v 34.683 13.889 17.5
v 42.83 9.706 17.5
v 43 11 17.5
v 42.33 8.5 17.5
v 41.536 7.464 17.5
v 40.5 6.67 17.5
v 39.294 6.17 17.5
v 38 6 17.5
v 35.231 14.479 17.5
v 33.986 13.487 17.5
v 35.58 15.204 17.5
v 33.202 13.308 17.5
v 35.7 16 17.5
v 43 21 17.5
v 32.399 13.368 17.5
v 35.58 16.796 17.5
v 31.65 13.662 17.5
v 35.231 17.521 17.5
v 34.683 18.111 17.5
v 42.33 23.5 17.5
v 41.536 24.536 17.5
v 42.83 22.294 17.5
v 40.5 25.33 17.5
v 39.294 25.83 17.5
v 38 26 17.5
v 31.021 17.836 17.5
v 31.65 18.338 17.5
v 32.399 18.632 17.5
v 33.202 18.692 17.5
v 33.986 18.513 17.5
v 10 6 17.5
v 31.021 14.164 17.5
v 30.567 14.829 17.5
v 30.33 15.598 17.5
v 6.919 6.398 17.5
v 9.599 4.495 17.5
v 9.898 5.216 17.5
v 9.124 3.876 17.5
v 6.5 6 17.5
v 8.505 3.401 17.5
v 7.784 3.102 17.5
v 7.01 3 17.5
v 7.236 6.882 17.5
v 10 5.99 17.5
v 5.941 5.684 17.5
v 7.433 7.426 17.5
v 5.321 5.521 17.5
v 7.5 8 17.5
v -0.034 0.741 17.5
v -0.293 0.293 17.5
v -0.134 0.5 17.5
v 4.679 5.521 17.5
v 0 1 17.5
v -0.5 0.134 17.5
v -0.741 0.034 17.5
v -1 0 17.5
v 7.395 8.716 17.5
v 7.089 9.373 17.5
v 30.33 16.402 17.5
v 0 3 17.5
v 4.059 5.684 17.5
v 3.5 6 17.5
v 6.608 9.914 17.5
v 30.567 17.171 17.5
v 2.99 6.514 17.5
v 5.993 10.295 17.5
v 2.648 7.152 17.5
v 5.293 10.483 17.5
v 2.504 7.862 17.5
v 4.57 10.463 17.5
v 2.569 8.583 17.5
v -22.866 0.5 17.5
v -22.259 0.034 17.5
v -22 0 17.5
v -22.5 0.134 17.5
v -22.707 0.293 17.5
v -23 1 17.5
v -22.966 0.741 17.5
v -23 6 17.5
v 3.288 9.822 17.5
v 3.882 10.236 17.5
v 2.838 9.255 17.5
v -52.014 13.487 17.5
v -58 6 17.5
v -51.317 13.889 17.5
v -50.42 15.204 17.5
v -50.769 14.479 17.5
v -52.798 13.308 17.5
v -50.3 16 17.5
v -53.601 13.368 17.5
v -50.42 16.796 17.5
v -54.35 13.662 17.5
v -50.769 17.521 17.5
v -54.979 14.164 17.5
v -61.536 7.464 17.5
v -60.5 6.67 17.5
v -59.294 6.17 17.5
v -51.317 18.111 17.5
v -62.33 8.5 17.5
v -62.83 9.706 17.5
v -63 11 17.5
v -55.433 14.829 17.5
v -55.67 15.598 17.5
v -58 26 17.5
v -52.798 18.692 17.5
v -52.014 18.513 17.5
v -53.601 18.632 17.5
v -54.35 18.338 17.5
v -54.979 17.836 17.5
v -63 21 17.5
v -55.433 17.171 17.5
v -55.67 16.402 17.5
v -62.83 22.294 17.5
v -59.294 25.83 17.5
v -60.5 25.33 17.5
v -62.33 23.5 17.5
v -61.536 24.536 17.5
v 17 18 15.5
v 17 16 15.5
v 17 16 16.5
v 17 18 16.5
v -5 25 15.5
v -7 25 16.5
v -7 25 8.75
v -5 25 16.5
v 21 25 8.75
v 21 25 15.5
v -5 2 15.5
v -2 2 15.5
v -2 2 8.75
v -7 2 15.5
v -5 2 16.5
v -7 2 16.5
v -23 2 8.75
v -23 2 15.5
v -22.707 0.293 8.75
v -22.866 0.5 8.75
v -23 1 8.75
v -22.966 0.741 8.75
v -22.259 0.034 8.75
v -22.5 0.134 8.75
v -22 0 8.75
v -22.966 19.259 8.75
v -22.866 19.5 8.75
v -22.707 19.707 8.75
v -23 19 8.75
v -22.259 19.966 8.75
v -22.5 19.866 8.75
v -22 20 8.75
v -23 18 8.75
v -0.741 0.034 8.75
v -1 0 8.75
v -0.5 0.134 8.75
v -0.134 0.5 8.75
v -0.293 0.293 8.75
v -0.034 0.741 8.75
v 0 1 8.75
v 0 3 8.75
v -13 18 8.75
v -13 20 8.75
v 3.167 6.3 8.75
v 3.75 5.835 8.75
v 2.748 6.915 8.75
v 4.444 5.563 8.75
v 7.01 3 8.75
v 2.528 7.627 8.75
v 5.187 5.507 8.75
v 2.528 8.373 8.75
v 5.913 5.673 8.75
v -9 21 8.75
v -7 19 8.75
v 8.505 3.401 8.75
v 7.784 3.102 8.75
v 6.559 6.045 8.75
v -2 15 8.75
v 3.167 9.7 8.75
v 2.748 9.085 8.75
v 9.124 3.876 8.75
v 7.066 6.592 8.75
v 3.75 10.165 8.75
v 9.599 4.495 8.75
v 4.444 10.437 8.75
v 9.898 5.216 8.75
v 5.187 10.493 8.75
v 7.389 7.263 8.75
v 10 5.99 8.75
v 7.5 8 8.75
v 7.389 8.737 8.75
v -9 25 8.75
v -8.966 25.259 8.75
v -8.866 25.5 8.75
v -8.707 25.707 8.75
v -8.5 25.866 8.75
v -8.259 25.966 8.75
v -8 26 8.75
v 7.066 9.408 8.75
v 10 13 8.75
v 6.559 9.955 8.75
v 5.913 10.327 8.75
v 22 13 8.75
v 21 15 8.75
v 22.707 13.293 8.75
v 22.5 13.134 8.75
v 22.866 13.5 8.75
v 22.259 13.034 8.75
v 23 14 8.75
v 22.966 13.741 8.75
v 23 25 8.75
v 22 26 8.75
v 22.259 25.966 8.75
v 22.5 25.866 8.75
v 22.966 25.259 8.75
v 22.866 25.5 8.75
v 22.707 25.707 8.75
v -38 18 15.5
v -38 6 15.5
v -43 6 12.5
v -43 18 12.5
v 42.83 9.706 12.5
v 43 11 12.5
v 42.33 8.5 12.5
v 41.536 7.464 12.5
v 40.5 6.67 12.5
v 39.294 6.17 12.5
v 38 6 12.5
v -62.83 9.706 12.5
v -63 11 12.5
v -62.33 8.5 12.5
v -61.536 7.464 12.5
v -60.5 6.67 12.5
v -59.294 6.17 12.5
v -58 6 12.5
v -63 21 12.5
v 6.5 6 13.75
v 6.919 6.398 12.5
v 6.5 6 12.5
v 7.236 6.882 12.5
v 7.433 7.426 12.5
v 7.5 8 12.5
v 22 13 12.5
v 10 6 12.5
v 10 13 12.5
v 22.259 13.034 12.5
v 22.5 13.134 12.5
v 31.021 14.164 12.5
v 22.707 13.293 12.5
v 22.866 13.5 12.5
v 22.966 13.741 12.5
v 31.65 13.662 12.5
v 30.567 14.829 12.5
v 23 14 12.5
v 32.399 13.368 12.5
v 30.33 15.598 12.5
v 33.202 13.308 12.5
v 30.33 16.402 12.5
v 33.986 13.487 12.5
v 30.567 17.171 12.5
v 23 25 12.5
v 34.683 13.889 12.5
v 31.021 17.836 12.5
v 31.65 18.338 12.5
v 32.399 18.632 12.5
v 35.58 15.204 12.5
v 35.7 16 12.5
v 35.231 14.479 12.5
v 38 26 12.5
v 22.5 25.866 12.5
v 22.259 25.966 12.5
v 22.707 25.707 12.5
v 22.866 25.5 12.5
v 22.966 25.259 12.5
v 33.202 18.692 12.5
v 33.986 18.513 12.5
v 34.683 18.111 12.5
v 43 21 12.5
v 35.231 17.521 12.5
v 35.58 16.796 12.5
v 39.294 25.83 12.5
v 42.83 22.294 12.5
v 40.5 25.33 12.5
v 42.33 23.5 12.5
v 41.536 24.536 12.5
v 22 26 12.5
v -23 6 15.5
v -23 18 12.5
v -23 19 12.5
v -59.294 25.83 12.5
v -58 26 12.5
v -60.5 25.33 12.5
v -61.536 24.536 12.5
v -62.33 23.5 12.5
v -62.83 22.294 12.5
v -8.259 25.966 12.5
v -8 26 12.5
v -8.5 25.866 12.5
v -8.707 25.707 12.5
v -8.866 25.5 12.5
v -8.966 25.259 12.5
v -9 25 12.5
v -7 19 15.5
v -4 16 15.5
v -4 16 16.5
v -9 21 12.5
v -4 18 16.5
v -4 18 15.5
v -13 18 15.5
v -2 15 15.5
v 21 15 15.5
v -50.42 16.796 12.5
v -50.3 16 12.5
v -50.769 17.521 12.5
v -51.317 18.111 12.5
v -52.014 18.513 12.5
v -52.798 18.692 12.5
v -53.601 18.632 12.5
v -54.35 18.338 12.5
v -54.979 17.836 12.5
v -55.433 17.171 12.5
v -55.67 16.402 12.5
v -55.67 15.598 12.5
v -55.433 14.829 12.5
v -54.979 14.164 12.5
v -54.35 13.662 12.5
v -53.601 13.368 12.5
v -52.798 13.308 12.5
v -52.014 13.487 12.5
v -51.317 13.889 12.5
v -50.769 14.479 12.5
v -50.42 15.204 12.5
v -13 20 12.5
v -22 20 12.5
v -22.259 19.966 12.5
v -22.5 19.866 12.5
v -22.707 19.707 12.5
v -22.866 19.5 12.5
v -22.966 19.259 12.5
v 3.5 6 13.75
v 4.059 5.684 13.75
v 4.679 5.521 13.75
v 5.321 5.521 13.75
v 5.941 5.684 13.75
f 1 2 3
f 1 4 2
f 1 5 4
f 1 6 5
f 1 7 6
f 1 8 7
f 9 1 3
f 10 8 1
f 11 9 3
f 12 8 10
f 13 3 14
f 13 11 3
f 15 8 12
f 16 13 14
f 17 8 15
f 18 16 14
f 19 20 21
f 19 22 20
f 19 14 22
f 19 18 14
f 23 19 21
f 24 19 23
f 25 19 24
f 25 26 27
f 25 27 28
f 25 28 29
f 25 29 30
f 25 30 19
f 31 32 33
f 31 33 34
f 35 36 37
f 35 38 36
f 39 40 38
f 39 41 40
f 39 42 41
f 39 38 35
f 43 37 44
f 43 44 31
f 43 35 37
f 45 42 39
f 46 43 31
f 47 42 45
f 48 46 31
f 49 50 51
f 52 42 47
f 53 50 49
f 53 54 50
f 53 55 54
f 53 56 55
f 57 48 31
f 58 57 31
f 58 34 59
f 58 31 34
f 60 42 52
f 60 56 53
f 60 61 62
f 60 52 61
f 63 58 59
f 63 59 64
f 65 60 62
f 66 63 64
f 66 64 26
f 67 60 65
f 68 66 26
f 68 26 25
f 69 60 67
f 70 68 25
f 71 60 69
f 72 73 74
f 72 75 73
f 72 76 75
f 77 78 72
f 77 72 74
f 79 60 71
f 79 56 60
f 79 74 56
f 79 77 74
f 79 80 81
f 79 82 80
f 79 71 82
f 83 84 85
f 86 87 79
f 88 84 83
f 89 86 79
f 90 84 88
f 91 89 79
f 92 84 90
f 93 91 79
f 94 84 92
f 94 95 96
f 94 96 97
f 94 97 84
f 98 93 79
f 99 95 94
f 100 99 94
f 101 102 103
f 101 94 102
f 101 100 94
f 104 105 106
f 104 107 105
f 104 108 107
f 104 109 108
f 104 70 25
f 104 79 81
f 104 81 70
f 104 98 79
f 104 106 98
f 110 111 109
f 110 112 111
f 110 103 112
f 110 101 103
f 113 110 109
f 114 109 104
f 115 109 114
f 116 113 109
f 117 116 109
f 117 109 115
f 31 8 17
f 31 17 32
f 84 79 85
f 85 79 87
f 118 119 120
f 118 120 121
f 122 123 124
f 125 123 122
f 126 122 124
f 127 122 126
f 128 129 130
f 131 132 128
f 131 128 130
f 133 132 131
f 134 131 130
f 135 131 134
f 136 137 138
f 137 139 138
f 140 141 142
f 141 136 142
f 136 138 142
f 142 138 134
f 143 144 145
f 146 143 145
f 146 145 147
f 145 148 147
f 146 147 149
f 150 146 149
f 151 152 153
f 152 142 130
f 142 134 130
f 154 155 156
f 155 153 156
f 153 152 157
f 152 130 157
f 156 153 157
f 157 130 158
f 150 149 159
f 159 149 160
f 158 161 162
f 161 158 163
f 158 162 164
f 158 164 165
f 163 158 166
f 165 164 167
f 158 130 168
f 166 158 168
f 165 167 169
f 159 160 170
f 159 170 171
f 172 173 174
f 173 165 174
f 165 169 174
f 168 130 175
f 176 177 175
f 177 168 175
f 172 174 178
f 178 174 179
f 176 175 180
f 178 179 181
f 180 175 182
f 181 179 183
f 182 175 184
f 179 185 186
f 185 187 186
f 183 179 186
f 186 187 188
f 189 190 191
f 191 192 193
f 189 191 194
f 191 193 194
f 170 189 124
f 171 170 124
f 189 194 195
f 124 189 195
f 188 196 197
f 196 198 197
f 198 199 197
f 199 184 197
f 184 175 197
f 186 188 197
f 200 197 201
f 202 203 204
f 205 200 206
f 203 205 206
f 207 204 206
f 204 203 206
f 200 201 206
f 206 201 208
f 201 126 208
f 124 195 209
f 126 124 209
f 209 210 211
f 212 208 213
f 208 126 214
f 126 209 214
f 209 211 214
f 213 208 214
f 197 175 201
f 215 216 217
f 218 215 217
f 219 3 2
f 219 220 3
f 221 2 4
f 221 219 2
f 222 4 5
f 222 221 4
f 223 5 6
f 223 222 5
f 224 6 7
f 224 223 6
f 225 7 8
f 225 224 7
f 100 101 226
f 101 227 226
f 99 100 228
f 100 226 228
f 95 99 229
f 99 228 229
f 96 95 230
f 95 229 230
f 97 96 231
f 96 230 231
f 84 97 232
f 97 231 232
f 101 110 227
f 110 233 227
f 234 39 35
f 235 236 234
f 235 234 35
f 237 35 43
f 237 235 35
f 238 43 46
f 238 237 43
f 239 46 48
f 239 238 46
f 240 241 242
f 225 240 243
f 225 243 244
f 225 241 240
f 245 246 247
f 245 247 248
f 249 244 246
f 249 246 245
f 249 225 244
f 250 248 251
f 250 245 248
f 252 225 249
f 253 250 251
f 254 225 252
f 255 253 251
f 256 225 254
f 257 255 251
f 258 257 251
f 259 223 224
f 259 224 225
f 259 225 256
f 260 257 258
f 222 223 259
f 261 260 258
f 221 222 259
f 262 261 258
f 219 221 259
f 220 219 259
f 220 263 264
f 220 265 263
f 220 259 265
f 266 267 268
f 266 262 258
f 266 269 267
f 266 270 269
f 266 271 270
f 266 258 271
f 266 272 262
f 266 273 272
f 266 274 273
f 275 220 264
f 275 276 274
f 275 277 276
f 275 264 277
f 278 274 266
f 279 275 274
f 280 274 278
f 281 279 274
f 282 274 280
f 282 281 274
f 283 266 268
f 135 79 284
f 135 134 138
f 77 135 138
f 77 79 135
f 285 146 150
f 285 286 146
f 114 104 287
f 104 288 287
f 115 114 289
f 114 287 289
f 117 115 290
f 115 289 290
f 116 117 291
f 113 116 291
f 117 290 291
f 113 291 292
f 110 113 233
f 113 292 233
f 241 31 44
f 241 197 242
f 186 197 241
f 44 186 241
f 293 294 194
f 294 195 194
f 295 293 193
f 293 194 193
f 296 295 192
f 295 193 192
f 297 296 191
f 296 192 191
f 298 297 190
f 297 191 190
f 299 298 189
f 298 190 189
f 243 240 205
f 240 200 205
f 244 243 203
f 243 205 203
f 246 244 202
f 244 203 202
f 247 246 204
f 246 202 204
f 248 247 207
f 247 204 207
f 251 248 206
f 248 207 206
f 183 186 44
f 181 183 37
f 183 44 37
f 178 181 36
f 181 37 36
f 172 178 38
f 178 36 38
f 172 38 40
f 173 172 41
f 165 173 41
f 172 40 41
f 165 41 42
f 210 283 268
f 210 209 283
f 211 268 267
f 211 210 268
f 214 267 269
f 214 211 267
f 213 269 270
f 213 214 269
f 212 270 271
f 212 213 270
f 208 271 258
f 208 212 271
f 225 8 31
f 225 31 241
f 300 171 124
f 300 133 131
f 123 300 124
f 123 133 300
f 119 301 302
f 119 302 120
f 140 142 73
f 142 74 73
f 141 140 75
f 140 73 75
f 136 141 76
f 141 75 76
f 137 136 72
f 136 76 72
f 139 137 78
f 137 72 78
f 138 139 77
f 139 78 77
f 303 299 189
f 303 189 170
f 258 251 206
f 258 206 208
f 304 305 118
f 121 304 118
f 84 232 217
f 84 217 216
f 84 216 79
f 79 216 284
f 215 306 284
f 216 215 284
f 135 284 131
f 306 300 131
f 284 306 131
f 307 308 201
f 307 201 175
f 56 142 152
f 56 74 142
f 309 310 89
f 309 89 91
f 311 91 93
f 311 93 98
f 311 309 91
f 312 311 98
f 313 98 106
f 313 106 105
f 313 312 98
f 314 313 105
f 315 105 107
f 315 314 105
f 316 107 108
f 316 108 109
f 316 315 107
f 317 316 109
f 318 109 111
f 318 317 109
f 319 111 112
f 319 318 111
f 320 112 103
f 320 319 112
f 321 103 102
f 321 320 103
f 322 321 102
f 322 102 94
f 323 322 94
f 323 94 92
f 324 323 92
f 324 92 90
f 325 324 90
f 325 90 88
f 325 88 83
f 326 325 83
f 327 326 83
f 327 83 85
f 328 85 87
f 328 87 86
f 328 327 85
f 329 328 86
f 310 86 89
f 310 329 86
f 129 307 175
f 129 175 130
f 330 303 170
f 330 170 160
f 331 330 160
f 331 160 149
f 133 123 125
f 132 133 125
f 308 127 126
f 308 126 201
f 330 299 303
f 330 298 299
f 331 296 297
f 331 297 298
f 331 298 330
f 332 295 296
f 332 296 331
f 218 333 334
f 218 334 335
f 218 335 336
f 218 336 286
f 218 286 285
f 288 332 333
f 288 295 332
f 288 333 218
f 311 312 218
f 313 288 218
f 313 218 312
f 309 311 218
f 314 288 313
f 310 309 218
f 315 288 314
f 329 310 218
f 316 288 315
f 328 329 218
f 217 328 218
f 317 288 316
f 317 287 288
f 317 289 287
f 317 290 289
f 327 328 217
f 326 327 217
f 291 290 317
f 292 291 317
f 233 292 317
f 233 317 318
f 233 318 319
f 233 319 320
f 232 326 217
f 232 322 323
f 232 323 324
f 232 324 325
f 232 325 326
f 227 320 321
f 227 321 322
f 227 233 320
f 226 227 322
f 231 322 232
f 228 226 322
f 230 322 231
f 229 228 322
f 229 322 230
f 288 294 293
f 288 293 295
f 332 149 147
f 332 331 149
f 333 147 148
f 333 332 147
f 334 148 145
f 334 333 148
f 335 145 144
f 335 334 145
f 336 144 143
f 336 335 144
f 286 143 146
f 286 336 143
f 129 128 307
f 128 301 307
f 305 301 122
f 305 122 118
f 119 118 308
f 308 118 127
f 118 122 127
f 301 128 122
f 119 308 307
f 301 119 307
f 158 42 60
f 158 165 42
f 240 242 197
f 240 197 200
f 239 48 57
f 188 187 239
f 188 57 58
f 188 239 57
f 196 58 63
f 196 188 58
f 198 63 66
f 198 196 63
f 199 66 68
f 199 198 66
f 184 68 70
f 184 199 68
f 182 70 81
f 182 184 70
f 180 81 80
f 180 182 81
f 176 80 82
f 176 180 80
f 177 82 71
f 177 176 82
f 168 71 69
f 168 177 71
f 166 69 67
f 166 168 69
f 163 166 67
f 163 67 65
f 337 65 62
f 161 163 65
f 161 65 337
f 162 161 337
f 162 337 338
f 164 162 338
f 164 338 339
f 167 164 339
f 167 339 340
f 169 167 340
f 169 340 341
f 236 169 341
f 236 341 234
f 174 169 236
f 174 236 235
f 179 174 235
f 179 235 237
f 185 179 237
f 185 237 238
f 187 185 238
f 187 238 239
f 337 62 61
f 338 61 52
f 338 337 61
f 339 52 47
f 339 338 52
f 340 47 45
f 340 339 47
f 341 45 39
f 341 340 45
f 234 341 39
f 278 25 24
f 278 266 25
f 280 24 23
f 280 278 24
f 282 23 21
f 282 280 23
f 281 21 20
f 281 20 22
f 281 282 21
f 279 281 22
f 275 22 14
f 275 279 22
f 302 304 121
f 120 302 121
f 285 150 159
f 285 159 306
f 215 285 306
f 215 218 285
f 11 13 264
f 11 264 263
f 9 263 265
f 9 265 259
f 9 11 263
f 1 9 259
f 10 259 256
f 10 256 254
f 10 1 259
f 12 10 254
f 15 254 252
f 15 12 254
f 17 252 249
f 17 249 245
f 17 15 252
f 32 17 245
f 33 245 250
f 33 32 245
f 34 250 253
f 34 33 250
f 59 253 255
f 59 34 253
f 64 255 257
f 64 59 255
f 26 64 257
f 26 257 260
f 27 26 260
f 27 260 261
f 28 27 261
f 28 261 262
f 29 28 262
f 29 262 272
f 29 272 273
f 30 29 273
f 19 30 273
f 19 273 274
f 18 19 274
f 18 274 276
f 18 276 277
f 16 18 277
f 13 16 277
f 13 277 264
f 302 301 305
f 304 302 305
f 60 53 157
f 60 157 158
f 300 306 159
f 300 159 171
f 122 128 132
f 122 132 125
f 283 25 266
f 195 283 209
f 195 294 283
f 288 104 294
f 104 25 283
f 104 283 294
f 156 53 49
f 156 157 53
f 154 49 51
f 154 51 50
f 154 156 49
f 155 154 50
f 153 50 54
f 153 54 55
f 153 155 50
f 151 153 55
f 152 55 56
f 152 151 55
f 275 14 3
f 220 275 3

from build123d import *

# Parameters (mm, degrees)
PAD101_DEPTH    = 2
PAD102_DEPTH    = 6.75
SKETCH142_W     = 2
SKETCH142_H     = 23
SKETCH142_W_2   = 21
SKETCH142_H_2   = 2
POCKET042_DEPTH = 1
SKETCH143_W     = 10
SKETCH143_H     = 10
PAD103_DEPTH    = 5
SKETCH144_R     = 2.5
POCKET043_DEPTH = 5
SKETCH145_W     = 20
SKETCH145_H     = 20
PAD104_DEPTH    = 5
SKETCH146_R     = 2.7
POCKET044_DEPTH = 8.751
PAD105_DEPTH    = 23
PAD106_DEPTH    = 3.75
POCKET045_DEPTH = 5.001
PAD107_DEPTH    = 20
SKETCH148_W     = 20
SKETCH148_H     = 5
PAD108_DEPTH    = 20
PAD109_DEPTH    = 14
SKETCH149_R     = 2.7
POCKET046_DEPTH = 5
FILLET021_R     = 5
FILLET022_R     = 2.99
FILLET023_R     = 1
PAD110_DEPTH    = 12


with BuildPart() as body050:
    # Sketch140 → Pad101 (new body)
    with BuildSketch(Plane.XY):
        Polygon((-23, 18), (-23, 0), (0, 0), (0, 13), (23, 13), (23, 26), (-7, 26), (-9, 26), (-9, 21), (-13, 20), (-23, 20), align=None)
    extrude(amount=PAD101_DEPTH)

    # Sketch141 (on Face13 of Pad101) → Pad102 (join)
    with BuildSketch(Plane.XY.offset(2)):
        Polygon((-23, 0), (0, 0), (0, 13), (23, 13), (23, 26), (-9, 26), (-9, 21), (-13, 20), (-23, 20), (-23, 18), (-13, 18), (-7, 19), (-7, 25), (21, 25), (21, 15), (-2, 15), (-2, 2), (-23, 2), align=None)
    extrude(amount=PAD102_DEPTH)

    # Sketch142 (on Face7 of Pad102) → Pocket042 (cut)
    with BuildSketch(Plane.XY.offset(2)):
        with Locations((-6, 13.5)):
            Rectangle(SKETCH142_W, SKETCH142_H)
        with Locations((6.5, 17)):
            Rectangle(SKETCH142_W_2, SKETCH142_H_2)
    extrude(amount=-POCKET042_DEPTH, mode=Mode.SUBTRACT)

    # Sketch143 (on Face18 of Pocket042) → Pad103 (join)
    with BuildSketch(Plane.XY.offset(8.75)):
        with Locations((5, 8)):
            Rectangle(SKETCH143_W, SKETCH143_H)
    extrude(amount=-PAD103_DEPTH)

    # Sketch144 (on Face29 of Pad103) → Pocket043 (cut)
    with BuildSketch(Plane.XY.offset(8.75)):
        with Locations((5, 8)):
            Circle(SKETCH144_R)
    extrude(amount=-POCKET043_DEPTH, mode=Mode.SUBTRACT)

    # Sketch145 (on Face4 of Pocket043) → Pad104 (join)
    with BuildSketch(Plane(origin=(0, 0, 0), x_dir=(1, 0, 0), z_dir=(0, 0, -1))):
        with Locations((33, -16)):
            Rectangle(SKETCH145_W, SKETCH145_H)
    extrude(amount=-PAD104_DEPTH)

    # Sketch146 (on Face13 of Pad104) → Pocket044 (cut, through all)
    with BuildSketch(Plane(origin=(0, 0, 0), x_dir=(1, 0, 0), z_dir=(0, 0, -1))):
        with Locations((33, -16)):
            Circle(SKETCH146_R)
    extrude(amount=-POCKET044_DEPTH, mode=Mode.SUBTRACT)

    # Pocket044 Face25 → Pad105 (add)
    with BuildSketch(Plane(origin=(23, 9.5, 2.5), x_dir=(0, 1, 0), z_dir=(-1, 0, 0))):
        Polygon((3.5, 2.5), (-3.5, 2.5), (-3.5, -2.5), (3.5, -2.5), (3.5, 0.5), align=None)
    extrude(amount=PAD105_DEPTH)

    # Pad105 Face46 → Pad106 (add)
    with BuildSketch(Plane(origin=(5, 4.454221, 3.75), x_dir=(0, -1, 0), z_dir=(0, 0, -1))):
        with BuildLine():
            Line((-1.545779, 5), (-1.545779, 1.5))
            ThreePointArc((-1.545779, 1.5), (-1.045779, 0), (-1.545779, -1.5))
            Line((-1.545779, -1.5), (-1.545779, -5))
            Line((-1.545779, -5), (1.454221, -5))
            Line((1.454221, -5), (1.454221, 5))
            Line((1.454221, 5), (-1.545779, 5))
        make_face()
    extrude(amount=PAD106_DEPTH)

    # Pad106 Face53 → Pocket045 (cut, through all)
    with BuildSketch(Plane(origin=(5, 8.120883, 5), x_dir=(0, 1, 0), z_dir=(0, 0, 1))):
        with BuildLine():
            ThreePointArc((-2.120883, -1.5), (-1.238917, -2.236068), (-0.120883, -2.5))
            ThreePointArc((-0.120883, -2.5), (2.115185, 1.118034), (-2.120883, 1.5))
            Line((-2.120883, 1.5), (-2.120883, -1.5))
        make_face()
    extrude(amount=-POCKET045_DEPTH, mode=Mode.SUBTRACT)

    # Sketch147 (on Face1 of Pocket045) → Pad107 (join)
    with BuildSketch(Plane(origin=(-23, 0, 0), x_dir=(0, -1, 0), z_dir=(-1, 0, 0))):
        Polygon((-26, 0), (-26, 5), (-18, 5), (-18, 2), (-6, 2), (-6, 0), align=None)
    extrude(amount=PAD107_DEPTH)

    # Sketch148 (on Face24 of Pad107) → Pad108 (join)
    with BuildSketch(Plane(origin=(-43, 0, 0), x_dir=(0, -1, 0), z_dir=(-1, 0, 0))):
        with Locations((-16, 2.5)):
            Rectangle(SKETCH148_W, SKETCH148_H)
    extrude(amount=PAD108_DEPTH)

    # Pad108 Face26 → Pad109 (add)
    with BuildSketch(Plane(origin=(-23, 23, 2.5), x_dir=(0, -1, 0), z_dir=(1, 0, 0))):
        Polygon((3, -2.5), (3, 0.5), (3, 2.5), (-3, 2.5), (-3, -2.5), align=None)
    extrude(amount=PAD109_DEPTH)

    # Sketch149 (on Face57 of Pad109) → Pocket046 (cut)
    with BuildSketch(Plane.XY.offset(5)):
        with Locations((-53, 16)):
            Circle(SKETCH149_R)
    extrude(amount=-POCKET046_DEPTH, mode=Mode.SUBTRACT)

    # Fillet021
    fillet021_edges = [body050.edges().sort_by_distance(p)[0] for p in [
        (-63, 26, 2.5),
        (-63, 6, 2.5),
        (43, 26, 2.5),
        (43, 6, 2.5),
    ]]
    fillet(fillet021_edges, radius=FILLET021_R)

    # Fillet022
    fillet022_edges = [body050.edges().sort_by_distance(p)[0] for p in [
        (10, 3, 1.875),
        (10, 3, 6.25),
    ]]
    fillet(fillet022_edges, radius=FILLET022_R)

    # Fillet023
    fillet023_edges = [body050.edges().sort_by_distance(p)[0] for p in [
        (-23, 0, 1),
        (-23, 0, 5.375),
        (0, 0, 5.375),
        (0, 0, 1),
        (23, 13, 6.875),
        (23, 26, 6.875),
        (-9, 26, 6.875),
        (-23, 20, 6.875),
    ]]
    fillet(fillet023_edges, radius=FILLET023_R)

    # Sketch150 (on Face26 of Fillet023) → Pad110 (join)
    with BuildSketch(Plane.XZ.offset(-6)):
        Polygon((-43, 5), (-43, 2), (-38, 2), align=None)
    extrude(amount=-PAD110_DEPTH)


with BuildPart() as part_mirroring003:
    # Part__Mirroring003: instance of Body050
    add(body050.part.mirror(Plane(origin=(0, 13, 0), x_dir=(0, 1, 0), z_dir=(0, 0, 1))))


with BuildPart() as part_mirroring003_1:
    # Part__Mirroring003 placement: moved
    add(part_mirroring003.part.moved(Location((0, 0, 17.5))))


solid = part_mirroring003_1.part
